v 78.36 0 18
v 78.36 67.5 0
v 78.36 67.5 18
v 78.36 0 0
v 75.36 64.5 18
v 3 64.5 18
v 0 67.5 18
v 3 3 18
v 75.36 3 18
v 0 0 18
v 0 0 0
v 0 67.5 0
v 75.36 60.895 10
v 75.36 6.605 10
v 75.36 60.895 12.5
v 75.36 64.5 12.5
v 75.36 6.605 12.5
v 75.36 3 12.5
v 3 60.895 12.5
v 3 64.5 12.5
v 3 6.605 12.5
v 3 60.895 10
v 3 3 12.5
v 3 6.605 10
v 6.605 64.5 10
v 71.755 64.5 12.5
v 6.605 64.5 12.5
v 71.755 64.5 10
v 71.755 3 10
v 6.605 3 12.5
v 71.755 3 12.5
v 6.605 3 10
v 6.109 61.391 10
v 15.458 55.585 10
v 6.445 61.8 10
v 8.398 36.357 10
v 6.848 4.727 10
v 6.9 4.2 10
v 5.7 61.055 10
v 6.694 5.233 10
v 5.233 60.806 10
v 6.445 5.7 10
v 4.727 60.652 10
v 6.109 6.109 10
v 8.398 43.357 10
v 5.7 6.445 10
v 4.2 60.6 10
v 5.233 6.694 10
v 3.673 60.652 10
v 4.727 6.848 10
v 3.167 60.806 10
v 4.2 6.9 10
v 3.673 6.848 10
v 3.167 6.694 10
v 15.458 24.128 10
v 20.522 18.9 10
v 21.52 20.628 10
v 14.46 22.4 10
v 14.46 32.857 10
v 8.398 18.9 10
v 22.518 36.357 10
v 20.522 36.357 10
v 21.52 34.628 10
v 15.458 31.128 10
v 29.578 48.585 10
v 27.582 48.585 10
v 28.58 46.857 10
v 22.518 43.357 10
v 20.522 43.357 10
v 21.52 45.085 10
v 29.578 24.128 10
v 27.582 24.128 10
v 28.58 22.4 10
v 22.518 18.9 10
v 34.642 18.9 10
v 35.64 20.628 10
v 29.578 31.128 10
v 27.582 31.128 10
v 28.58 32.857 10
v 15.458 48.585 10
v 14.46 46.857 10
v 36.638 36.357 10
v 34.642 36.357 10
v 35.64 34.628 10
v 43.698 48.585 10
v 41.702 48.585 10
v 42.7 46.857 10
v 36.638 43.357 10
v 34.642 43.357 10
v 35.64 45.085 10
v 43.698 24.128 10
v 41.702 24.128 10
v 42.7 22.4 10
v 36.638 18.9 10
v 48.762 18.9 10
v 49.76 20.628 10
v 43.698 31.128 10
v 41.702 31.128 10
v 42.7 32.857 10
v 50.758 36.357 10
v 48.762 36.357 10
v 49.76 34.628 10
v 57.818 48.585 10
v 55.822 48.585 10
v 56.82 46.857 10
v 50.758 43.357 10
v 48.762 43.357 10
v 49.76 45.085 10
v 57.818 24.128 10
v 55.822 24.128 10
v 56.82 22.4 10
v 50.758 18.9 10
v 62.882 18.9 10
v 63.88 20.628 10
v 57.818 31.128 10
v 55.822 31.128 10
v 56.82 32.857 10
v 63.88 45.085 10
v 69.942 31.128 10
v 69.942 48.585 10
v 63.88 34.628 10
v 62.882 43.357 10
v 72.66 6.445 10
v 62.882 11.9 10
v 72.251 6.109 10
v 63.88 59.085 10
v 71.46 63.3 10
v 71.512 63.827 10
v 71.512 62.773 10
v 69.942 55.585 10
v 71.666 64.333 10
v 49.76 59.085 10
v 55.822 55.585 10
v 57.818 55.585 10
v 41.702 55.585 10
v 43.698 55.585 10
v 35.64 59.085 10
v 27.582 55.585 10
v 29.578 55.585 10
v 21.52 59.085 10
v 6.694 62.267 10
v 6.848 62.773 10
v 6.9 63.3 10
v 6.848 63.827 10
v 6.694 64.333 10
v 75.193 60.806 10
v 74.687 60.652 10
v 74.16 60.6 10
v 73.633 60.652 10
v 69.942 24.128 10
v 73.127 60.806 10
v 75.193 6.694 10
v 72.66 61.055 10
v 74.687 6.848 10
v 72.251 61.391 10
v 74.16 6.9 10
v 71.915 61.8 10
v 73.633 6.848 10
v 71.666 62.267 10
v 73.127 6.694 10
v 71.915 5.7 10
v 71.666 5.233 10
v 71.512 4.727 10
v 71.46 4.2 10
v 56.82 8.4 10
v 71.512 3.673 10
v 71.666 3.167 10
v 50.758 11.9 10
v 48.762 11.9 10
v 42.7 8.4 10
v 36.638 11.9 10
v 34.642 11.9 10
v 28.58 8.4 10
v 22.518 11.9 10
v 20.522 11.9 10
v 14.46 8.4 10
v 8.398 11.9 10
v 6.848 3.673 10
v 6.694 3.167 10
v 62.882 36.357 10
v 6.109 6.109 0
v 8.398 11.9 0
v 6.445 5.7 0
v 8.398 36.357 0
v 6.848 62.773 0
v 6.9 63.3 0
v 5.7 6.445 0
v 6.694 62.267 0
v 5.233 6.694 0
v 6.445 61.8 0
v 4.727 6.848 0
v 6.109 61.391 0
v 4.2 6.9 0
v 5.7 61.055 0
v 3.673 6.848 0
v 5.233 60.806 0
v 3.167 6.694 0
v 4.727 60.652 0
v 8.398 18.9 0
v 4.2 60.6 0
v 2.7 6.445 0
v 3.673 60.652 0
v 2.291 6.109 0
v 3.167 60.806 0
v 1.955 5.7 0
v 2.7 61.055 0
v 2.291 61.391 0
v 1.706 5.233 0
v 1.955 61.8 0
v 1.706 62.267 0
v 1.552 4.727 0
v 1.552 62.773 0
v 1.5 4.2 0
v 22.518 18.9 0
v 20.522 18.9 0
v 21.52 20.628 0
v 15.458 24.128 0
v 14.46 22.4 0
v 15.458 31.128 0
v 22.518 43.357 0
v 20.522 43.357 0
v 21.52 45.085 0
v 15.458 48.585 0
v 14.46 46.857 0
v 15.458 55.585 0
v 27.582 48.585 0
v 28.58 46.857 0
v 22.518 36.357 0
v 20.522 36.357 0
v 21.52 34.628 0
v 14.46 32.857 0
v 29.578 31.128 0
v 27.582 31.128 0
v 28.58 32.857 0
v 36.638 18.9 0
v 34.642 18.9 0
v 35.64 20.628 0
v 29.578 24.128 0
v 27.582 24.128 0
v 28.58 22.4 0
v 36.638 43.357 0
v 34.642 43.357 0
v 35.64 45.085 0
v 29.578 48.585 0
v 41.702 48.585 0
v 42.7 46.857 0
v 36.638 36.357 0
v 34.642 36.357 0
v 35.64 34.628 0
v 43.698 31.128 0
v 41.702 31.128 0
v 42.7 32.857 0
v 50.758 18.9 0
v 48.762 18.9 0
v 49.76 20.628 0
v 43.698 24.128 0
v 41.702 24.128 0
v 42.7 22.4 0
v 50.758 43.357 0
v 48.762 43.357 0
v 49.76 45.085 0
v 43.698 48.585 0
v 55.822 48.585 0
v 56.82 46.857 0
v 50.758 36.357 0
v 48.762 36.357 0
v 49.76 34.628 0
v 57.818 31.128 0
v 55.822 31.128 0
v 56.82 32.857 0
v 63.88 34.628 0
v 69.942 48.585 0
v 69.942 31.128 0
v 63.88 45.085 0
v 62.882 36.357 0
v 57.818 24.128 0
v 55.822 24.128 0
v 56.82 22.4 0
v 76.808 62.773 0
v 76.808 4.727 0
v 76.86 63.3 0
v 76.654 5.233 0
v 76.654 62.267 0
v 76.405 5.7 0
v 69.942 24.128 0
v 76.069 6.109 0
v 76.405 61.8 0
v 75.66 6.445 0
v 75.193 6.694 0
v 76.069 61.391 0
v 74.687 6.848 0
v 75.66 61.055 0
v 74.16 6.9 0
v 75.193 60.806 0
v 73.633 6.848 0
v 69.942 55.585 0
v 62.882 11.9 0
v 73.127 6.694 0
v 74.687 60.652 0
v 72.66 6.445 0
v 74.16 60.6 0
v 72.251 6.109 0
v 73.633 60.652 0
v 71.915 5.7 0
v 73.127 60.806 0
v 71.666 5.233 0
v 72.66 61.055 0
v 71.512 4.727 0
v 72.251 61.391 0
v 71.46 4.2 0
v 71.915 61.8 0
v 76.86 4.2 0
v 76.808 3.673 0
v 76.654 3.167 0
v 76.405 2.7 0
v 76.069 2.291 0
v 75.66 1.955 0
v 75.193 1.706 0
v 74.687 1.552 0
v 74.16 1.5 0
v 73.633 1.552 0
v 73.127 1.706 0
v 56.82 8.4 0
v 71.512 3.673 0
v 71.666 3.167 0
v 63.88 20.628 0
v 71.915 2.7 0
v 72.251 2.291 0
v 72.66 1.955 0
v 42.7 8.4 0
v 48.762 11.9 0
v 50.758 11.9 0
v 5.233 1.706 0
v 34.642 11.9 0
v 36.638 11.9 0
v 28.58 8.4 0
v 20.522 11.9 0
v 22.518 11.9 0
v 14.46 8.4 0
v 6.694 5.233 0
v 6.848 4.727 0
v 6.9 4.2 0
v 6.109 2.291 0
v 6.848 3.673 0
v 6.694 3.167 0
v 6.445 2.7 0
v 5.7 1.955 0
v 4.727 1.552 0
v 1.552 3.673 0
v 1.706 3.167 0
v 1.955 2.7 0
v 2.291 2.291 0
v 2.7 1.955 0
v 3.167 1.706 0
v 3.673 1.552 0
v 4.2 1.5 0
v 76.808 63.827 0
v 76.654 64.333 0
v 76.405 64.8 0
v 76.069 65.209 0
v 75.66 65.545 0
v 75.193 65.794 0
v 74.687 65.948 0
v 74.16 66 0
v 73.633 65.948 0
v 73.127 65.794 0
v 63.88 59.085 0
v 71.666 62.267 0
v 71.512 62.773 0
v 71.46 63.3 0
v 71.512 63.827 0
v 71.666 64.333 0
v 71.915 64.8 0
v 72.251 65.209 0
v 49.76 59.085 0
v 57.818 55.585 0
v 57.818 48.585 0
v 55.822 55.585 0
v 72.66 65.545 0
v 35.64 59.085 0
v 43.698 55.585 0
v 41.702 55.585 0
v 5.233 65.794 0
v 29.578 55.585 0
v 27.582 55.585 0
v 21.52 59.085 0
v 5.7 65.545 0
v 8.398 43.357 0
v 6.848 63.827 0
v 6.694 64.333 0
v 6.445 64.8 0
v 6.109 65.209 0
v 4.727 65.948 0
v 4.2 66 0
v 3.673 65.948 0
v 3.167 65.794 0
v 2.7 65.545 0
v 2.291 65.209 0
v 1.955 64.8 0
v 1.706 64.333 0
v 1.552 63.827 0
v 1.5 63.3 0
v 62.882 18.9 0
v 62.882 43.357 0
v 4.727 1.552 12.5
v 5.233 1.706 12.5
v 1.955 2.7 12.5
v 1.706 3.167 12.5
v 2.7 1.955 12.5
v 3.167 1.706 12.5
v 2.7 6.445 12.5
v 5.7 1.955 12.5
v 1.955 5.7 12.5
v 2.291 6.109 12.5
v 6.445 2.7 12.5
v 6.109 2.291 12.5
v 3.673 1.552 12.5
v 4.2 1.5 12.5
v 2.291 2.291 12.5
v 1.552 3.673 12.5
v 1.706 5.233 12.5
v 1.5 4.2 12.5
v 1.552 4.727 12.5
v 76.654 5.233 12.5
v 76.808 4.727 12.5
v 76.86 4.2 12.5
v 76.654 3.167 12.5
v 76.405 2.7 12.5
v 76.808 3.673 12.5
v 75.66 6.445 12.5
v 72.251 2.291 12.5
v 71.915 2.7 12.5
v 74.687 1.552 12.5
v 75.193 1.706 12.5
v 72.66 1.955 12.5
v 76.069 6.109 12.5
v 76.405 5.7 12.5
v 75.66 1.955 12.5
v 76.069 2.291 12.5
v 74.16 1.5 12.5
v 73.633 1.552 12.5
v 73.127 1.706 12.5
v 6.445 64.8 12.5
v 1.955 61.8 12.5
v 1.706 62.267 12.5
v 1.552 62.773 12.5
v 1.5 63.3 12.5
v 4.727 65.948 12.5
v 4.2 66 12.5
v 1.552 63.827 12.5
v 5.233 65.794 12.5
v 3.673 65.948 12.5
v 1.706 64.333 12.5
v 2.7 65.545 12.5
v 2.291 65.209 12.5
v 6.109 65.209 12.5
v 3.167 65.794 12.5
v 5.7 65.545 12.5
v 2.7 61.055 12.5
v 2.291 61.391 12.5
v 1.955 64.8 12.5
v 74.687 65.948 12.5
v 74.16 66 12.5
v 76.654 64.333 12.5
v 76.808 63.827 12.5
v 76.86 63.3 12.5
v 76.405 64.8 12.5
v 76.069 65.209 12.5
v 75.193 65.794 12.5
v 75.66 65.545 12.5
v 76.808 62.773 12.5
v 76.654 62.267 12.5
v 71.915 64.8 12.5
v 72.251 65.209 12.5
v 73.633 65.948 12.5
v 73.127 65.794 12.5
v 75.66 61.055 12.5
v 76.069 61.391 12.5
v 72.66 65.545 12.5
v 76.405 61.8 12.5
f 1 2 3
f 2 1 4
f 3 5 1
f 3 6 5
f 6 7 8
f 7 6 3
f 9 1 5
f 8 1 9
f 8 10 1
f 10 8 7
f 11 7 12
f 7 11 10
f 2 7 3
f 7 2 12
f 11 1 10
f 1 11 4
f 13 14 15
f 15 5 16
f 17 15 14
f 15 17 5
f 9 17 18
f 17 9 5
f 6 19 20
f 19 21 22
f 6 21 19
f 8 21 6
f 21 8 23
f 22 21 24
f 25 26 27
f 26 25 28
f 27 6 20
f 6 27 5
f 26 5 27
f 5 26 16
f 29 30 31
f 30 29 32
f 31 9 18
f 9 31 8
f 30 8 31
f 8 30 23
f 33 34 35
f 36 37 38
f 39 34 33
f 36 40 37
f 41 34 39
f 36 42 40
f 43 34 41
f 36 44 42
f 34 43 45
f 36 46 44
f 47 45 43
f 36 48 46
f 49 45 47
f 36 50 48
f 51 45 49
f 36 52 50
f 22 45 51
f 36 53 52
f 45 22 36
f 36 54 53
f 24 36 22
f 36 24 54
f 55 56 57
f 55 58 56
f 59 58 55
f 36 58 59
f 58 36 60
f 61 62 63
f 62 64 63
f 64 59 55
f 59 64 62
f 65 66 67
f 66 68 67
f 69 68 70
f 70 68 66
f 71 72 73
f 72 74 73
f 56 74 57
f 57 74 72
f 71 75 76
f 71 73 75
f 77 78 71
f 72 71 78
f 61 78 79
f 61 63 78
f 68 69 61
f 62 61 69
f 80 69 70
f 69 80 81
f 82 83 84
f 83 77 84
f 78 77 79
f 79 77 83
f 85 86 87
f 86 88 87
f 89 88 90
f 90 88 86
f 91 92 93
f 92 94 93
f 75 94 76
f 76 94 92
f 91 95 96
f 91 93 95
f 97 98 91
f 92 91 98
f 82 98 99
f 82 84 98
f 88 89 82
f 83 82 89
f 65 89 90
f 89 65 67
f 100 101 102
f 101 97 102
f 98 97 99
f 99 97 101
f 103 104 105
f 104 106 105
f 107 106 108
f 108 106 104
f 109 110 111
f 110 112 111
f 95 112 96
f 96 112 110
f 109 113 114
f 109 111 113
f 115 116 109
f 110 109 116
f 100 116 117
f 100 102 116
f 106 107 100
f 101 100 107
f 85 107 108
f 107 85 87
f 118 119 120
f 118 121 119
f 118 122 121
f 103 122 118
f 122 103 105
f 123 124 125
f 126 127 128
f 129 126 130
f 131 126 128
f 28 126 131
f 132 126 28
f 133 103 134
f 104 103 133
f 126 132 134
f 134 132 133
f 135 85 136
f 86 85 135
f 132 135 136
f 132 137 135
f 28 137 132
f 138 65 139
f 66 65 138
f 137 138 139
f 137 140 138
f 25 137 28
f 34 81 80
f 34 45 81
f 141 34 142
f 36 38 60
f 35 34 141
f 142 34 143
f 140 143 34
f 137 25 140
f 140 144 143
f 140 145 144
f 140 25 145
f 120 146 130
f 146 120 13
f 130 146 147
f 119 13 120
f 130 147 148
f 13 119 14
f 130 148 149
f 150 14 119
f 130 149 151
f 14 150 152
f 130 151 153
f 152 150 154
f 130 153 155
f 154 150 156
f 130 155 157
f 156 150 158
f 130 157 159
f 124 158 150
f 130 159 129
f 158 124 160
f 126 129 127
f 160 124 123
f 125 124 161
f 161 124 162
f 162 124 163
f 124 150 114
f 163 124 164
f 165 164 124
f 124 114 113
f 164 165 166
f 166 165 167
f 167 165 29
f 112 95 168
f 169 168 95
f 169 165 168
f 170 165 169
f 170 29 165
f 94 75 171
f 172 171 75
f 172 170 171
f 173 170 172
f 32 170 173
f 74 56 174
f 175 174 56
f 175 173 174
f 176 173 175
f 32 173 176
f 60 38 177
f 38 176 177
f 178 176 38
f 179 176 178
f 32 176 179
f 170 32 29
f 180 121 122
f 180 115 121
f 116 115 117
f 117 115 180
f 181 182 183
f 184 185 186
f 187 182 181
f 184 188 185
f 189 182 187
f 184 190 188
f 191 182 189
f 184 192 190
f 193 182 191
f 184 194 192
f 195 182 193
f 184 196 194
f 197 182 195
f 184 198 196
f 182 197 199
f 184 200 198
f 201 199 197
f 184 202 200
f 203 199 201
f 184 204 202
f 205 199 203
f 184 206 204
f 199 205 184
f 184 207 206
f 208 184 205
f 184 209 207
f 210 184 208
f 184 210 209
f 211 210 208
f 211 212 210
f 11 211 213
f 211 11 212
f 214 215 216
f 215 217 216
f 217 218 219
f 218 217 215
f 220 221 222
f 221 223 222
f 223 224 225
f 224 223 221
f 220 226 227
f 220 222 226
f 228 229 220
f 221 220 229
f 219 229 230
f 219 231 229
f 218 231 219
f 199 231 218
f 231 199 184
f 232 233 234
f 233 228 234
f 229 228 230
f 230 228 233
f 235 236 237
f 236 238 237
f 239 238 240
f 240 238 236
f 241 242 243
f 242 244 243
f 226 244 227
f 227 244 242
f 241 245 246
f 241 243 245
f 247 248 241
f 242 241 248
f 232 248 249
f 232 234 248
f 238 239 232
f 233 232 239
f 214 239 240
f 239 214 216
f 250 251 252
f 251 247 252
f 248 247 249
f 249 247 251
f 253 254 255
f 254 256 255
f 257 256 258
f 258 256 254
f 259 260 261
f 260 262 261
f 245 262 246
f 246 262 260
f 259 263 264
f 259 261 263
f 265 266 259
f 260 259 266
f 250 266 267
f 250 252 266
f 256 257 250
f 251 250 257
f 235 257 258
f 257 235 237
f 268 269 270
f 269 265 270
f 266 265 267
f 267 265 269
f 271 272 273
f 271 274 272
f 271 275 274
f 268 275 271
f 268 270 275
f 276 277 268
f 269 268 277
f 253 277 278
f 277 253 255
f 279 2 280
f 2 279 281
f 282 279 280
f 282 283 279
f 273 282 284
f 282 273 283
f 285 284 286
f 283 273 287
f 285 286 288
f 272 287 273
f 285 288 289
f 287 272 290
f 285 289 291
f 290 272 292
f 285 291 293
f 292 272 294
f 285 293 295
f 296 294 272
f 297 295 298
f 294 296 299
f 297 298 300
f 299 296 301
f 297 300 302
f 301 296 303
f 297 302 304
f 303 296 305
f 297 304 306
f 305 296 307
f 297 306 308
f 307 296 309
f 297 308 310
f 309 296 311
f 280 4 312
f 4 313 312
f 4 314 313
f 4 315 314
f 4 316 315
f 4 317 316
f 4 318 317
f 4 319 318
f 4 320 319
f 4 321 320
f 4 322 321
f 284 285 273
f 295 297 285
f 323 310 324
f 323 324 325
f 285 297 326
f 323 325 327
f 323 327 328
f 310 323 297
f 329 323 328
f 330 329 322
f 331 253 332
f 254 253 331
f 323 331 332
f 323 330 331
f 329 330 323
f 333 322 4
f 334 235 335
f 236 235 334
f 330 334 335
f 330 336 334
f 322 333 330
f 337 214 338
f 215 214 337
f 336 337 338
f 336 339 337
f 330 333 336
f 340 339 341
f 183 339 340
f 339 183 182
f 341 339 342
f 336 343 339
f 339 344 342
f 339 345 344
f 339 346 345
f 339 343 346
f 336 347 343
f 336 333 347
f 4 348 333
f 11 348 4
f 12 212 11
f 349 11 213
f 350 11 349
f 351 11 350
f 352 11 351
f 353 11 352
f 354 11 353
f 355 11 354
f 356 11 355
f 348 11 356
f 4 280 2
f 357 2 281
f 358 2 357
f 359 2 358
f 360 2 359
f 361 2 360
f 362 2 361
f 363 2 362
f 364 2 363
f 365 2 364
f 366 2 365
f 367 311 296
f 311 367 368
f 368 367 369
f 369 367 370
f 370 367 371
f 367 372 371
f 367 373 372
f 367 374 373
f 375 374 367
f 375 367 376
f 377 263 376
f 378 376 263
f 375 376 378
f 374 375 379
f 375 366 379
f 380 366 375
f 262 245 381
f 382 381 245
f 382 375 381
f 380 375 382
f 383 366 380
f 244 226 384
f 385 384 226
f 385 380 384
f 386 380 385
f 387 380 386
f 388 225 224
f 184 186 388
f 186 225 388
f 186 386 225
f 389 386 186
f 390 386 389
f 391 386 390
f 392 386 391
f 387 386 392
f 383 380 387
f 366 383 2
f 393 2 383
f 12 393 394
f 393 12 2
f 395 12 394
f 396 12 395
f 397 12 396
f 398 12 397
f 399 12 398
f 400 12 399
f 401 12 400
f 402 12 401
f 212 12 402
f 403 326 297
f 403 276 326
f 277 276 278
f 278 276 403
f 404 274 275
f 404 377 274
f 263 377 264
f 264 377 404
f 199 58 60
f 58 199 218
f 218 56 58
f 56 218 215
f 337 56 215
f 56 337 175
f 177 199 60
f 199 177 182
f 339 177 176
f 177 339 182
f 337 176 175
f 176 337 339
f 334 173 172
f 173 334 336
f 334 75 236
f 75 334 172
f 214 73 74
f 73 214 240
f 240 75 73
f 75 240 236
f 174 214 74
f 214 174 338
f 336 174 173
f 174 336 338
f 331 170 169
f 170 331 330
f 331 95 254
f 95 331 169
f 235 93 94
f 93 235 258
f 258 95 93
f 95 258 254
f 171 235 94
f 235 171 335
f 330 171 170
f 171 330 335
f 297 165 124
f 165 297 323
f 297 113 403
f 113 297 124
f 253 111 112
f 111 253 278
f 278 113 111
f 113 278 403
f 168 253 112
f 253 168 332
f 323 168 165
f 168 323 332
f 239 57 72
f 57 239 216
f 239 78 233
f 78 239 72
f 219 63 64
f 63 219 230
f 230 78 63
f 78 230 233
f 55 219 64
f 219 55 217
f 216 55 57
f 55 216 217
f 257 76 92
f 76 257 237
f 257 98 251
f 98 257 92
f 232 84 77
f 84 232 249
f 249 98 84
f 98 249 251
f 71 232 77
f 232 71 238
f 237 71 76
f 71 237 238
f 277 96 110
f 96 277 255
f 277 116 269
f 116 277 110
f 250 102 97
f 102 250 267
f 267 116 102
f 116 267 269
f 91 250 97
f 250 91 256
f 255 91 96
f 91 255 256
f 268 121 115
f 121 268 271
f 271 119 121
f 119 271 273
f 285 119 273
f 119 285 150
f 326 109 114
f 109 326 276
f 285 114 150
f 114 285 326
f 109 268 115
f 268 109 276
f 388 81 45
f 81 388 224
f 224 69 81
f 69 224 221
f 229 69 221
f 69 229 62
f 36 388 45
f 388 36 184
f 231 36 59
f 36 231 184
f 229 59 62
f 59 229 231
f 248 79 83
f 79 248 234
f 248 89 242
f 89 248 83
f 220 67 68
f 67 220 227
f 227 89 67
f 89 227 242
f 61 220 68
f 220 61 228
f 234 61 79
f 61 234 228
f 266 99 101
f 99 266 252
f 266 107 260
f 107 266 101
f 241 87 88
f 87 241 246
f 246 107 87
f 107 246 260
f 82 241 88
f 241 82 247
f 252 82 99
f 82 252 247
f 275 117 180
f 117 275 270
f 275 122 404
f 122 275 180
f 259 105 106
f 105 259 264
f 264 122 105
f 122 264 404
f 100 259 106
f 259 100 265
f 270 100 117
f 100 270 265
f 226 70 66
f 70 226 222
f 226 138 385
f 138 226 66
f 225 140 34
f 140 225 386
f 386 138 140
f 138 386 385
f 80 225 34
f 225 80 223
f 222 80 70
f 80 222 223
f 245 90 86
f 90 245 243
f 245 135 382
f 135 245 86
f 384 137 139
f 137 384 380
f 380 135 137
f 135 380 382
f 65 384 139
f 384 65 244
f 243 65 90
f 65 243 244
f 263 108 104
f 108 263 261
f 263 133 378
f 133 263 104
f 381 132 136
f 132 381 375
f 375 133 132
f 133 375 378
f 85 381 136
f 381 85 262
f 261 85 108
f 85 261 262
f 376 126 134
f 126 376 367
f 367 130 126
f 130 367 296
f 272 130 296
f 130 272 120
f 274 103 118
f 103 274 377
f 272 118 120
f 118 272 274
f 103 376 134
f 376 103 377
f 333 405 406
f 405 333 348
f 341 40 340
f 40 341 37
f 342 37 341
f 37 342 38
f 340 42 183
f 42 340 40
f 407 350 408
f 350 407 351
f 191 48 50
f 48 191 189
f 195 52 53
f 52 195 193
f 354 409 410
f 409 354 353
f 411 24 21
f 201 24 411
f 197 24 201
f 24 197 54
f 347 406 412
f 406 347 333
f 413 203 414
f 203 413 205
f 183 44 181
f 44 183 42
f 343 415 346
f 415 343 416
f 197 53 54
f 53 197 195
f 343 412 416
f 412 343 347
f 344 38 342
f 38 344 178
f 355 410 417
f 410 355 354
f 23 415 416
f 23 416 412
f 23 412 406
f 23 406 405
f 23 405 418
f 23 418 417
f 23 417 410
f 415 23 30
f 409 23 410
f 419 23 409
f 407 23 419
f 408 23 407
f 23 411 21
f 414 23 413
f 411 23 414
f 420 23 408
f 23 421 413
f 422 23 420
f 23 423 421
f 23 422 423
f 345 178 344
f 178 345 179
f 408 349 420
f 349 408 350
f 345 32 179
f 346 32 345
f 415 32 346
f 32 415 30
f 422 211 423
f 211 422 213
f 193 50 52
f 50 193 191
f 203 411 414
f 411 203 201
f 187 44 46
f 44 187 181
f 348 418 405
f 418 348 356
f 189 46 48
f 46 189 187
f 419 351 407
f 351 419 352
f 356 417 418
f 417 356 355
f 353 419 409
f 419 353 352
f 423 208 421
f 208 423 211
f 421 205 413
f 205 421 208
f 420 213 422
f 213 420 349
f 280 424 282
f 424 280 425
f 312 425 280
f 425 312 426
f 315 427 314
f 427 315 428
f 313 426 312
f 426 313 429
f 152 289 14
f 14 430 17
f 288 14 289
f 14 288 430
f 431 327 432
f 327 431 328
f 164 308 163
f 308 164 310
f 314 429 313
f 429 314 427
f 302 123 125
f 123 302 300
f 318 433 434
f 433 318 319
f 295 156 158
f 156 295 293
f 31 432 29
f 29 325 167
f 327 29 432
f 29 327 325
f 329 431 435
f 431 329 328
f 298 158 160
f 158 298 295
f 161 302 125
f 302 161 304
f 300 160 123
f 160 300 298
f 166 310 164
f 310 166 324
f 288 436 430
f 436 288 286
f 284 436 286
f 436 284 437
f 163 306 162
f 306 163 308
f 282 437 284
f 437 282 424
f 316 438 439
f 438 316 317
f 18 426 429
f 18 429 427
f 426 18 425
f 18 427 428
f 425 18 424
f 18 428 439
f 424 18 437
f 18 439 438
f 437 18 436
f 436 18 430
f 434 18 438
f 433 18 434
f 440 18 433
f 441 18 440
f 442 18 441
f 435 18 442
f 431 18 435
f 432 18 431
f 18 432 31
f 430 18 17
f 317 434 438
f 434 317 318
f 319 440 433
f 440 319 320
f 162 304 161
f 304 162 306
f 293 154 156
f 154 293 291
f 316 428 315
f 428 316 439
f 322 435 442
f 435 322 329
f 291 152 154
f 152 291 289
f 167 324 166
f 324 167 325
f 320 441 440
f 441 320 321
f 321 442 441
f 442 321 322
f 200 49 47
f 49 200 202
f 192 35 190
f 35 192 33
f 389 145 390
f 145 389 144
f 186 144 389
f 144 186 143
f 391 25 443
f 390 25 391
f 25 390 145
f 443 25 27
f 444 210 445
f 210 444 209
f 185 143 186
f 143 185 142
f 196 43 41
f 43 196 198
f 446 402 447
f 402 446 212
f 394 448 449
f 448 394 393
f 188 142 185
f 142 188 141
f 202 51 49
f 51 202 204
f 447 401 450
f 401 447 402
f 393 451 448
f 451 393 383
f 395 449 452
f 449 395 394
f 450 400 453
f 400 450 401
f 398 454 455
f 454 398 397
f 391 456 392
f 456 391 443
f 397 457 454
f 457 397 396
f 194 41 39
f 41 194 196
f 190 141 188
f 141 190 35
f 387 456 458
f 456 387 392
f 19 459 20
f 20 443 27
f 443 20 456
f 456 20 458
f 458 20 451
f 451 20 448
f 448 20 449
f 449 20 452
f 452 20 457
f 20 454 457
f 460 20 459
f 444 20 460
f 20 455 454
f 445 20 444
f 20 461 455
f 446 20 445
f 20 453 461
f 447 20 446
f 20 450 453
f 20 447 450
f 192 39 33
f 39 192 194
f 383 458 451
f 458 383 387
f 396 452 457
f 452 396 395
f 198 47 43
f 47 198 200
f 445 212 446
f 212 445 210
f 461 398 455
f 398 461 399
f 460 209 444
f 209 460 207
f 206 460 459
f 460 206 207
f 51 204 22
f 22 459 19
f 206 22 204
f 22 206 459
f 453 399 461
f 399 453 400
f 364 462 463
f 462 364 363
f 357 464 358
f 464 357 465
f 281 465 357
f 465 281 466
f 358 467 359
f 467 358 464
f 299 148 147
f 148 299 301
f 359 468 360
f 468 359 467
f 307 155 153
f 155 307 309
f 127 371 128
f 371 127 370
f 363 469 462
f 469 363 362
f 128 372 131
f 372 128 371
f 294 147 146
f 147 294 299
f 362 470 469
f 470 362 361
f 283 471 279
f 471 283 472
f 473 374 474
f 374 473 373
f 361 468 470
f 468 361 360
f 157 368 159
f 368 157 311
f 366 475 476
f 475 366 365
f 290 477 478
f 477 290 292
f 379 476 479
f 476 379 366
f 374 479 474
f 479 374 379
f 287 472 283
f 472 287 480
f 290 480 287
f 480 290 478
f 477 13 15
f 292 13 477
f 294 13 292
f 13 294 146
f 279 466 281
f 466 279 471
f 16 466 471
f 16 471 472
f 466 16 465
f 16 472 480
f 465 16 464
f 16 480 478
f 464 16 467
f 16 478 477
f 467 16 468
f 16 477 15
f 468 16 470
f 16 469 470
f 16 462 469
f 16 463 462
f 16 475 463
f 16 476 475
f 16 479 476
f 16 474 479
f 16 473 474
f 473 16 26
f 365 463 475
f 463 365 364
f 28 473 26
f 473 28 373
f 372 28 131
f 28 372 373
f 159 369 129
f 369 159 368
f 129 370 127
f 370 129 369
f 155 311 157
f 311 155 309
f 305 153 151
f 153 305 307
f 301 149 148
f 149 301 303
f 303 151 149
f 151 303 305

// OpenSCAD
$fn = 32;

// ----------------------------------------------------------------------
// Honeycomb panel: 78.36 x 67.5 mm, 16 cells of 14 mm
// ----------------------------------------------------------------------

// --- parameters (mm) ---
panel_w = 78.36;          // panel width
panel_d = 67.5;           // panel depth
thick = 10;               // panel thickness
cell_r = 7;               // hex cell circumradius
pitch = 14.12;            // hex cell pitch (centre to centre)
web = 2;                  // web between the cells
columns = 4;              // columns of cells
rows = 4;                 // rows of cells
cell_count = 16;          // total cells
shift_x = 14.46;          // first cell offset in x
shift_y = 15.4;           // first cell offset in y
mount_d = 5.4;            // corner mounting holes
hole_off = 4.2;           // mounting hole offset from the corners
rim_h = 18;               // rim height
rim_t = 3;                // rim wall thickness

difference() {
  union() {
    cube([panel_w, panel_d, thick]);
    /* rim around the panel, sunk 1 mm into the plate */
    translate([0, 0, thick - 1]) difference() {
      cube([panel_w, panel_d, rim_h - thick + 1]);
      translate([rim_t, rim_t, -2.5]) cube([panel_w - 2 * rim_t, panel_d - 2 * rim_t, rim_h - thick + 6]);
    }
  }
  /* hexagonal cells, point-up, cut right through the plate */
  for (row = [0 : rows - 1]) {
    for (col = [0 : columns - 1]) {
      translate([shift_x + col * pitch + (row % 2) * pitch / 2, shift_y + row * pitch * 0.866025, -2.5]) rotate([0, 0, 30]) cylinder(h = thick + 5, d = 2 * cell_r, $fn = 6);
    }
  }
  /* corner mounting holes, clear of the outer cell web */
  translate([4.2, 4.2, -2.5]) cylinder(h = thick + 5, d = mount_d);
  translate([74.16, 4.2, -2.5]) cylinder(h = thick + 5, d = mount_d);
  translate([4.2, 63.3, -2.5]) cylinder(h = thick + 5, d = mount_d);
  translate([74.16, 63.3, -2.5]) cylinder(h = thick + 5, d = mount_d);
}
